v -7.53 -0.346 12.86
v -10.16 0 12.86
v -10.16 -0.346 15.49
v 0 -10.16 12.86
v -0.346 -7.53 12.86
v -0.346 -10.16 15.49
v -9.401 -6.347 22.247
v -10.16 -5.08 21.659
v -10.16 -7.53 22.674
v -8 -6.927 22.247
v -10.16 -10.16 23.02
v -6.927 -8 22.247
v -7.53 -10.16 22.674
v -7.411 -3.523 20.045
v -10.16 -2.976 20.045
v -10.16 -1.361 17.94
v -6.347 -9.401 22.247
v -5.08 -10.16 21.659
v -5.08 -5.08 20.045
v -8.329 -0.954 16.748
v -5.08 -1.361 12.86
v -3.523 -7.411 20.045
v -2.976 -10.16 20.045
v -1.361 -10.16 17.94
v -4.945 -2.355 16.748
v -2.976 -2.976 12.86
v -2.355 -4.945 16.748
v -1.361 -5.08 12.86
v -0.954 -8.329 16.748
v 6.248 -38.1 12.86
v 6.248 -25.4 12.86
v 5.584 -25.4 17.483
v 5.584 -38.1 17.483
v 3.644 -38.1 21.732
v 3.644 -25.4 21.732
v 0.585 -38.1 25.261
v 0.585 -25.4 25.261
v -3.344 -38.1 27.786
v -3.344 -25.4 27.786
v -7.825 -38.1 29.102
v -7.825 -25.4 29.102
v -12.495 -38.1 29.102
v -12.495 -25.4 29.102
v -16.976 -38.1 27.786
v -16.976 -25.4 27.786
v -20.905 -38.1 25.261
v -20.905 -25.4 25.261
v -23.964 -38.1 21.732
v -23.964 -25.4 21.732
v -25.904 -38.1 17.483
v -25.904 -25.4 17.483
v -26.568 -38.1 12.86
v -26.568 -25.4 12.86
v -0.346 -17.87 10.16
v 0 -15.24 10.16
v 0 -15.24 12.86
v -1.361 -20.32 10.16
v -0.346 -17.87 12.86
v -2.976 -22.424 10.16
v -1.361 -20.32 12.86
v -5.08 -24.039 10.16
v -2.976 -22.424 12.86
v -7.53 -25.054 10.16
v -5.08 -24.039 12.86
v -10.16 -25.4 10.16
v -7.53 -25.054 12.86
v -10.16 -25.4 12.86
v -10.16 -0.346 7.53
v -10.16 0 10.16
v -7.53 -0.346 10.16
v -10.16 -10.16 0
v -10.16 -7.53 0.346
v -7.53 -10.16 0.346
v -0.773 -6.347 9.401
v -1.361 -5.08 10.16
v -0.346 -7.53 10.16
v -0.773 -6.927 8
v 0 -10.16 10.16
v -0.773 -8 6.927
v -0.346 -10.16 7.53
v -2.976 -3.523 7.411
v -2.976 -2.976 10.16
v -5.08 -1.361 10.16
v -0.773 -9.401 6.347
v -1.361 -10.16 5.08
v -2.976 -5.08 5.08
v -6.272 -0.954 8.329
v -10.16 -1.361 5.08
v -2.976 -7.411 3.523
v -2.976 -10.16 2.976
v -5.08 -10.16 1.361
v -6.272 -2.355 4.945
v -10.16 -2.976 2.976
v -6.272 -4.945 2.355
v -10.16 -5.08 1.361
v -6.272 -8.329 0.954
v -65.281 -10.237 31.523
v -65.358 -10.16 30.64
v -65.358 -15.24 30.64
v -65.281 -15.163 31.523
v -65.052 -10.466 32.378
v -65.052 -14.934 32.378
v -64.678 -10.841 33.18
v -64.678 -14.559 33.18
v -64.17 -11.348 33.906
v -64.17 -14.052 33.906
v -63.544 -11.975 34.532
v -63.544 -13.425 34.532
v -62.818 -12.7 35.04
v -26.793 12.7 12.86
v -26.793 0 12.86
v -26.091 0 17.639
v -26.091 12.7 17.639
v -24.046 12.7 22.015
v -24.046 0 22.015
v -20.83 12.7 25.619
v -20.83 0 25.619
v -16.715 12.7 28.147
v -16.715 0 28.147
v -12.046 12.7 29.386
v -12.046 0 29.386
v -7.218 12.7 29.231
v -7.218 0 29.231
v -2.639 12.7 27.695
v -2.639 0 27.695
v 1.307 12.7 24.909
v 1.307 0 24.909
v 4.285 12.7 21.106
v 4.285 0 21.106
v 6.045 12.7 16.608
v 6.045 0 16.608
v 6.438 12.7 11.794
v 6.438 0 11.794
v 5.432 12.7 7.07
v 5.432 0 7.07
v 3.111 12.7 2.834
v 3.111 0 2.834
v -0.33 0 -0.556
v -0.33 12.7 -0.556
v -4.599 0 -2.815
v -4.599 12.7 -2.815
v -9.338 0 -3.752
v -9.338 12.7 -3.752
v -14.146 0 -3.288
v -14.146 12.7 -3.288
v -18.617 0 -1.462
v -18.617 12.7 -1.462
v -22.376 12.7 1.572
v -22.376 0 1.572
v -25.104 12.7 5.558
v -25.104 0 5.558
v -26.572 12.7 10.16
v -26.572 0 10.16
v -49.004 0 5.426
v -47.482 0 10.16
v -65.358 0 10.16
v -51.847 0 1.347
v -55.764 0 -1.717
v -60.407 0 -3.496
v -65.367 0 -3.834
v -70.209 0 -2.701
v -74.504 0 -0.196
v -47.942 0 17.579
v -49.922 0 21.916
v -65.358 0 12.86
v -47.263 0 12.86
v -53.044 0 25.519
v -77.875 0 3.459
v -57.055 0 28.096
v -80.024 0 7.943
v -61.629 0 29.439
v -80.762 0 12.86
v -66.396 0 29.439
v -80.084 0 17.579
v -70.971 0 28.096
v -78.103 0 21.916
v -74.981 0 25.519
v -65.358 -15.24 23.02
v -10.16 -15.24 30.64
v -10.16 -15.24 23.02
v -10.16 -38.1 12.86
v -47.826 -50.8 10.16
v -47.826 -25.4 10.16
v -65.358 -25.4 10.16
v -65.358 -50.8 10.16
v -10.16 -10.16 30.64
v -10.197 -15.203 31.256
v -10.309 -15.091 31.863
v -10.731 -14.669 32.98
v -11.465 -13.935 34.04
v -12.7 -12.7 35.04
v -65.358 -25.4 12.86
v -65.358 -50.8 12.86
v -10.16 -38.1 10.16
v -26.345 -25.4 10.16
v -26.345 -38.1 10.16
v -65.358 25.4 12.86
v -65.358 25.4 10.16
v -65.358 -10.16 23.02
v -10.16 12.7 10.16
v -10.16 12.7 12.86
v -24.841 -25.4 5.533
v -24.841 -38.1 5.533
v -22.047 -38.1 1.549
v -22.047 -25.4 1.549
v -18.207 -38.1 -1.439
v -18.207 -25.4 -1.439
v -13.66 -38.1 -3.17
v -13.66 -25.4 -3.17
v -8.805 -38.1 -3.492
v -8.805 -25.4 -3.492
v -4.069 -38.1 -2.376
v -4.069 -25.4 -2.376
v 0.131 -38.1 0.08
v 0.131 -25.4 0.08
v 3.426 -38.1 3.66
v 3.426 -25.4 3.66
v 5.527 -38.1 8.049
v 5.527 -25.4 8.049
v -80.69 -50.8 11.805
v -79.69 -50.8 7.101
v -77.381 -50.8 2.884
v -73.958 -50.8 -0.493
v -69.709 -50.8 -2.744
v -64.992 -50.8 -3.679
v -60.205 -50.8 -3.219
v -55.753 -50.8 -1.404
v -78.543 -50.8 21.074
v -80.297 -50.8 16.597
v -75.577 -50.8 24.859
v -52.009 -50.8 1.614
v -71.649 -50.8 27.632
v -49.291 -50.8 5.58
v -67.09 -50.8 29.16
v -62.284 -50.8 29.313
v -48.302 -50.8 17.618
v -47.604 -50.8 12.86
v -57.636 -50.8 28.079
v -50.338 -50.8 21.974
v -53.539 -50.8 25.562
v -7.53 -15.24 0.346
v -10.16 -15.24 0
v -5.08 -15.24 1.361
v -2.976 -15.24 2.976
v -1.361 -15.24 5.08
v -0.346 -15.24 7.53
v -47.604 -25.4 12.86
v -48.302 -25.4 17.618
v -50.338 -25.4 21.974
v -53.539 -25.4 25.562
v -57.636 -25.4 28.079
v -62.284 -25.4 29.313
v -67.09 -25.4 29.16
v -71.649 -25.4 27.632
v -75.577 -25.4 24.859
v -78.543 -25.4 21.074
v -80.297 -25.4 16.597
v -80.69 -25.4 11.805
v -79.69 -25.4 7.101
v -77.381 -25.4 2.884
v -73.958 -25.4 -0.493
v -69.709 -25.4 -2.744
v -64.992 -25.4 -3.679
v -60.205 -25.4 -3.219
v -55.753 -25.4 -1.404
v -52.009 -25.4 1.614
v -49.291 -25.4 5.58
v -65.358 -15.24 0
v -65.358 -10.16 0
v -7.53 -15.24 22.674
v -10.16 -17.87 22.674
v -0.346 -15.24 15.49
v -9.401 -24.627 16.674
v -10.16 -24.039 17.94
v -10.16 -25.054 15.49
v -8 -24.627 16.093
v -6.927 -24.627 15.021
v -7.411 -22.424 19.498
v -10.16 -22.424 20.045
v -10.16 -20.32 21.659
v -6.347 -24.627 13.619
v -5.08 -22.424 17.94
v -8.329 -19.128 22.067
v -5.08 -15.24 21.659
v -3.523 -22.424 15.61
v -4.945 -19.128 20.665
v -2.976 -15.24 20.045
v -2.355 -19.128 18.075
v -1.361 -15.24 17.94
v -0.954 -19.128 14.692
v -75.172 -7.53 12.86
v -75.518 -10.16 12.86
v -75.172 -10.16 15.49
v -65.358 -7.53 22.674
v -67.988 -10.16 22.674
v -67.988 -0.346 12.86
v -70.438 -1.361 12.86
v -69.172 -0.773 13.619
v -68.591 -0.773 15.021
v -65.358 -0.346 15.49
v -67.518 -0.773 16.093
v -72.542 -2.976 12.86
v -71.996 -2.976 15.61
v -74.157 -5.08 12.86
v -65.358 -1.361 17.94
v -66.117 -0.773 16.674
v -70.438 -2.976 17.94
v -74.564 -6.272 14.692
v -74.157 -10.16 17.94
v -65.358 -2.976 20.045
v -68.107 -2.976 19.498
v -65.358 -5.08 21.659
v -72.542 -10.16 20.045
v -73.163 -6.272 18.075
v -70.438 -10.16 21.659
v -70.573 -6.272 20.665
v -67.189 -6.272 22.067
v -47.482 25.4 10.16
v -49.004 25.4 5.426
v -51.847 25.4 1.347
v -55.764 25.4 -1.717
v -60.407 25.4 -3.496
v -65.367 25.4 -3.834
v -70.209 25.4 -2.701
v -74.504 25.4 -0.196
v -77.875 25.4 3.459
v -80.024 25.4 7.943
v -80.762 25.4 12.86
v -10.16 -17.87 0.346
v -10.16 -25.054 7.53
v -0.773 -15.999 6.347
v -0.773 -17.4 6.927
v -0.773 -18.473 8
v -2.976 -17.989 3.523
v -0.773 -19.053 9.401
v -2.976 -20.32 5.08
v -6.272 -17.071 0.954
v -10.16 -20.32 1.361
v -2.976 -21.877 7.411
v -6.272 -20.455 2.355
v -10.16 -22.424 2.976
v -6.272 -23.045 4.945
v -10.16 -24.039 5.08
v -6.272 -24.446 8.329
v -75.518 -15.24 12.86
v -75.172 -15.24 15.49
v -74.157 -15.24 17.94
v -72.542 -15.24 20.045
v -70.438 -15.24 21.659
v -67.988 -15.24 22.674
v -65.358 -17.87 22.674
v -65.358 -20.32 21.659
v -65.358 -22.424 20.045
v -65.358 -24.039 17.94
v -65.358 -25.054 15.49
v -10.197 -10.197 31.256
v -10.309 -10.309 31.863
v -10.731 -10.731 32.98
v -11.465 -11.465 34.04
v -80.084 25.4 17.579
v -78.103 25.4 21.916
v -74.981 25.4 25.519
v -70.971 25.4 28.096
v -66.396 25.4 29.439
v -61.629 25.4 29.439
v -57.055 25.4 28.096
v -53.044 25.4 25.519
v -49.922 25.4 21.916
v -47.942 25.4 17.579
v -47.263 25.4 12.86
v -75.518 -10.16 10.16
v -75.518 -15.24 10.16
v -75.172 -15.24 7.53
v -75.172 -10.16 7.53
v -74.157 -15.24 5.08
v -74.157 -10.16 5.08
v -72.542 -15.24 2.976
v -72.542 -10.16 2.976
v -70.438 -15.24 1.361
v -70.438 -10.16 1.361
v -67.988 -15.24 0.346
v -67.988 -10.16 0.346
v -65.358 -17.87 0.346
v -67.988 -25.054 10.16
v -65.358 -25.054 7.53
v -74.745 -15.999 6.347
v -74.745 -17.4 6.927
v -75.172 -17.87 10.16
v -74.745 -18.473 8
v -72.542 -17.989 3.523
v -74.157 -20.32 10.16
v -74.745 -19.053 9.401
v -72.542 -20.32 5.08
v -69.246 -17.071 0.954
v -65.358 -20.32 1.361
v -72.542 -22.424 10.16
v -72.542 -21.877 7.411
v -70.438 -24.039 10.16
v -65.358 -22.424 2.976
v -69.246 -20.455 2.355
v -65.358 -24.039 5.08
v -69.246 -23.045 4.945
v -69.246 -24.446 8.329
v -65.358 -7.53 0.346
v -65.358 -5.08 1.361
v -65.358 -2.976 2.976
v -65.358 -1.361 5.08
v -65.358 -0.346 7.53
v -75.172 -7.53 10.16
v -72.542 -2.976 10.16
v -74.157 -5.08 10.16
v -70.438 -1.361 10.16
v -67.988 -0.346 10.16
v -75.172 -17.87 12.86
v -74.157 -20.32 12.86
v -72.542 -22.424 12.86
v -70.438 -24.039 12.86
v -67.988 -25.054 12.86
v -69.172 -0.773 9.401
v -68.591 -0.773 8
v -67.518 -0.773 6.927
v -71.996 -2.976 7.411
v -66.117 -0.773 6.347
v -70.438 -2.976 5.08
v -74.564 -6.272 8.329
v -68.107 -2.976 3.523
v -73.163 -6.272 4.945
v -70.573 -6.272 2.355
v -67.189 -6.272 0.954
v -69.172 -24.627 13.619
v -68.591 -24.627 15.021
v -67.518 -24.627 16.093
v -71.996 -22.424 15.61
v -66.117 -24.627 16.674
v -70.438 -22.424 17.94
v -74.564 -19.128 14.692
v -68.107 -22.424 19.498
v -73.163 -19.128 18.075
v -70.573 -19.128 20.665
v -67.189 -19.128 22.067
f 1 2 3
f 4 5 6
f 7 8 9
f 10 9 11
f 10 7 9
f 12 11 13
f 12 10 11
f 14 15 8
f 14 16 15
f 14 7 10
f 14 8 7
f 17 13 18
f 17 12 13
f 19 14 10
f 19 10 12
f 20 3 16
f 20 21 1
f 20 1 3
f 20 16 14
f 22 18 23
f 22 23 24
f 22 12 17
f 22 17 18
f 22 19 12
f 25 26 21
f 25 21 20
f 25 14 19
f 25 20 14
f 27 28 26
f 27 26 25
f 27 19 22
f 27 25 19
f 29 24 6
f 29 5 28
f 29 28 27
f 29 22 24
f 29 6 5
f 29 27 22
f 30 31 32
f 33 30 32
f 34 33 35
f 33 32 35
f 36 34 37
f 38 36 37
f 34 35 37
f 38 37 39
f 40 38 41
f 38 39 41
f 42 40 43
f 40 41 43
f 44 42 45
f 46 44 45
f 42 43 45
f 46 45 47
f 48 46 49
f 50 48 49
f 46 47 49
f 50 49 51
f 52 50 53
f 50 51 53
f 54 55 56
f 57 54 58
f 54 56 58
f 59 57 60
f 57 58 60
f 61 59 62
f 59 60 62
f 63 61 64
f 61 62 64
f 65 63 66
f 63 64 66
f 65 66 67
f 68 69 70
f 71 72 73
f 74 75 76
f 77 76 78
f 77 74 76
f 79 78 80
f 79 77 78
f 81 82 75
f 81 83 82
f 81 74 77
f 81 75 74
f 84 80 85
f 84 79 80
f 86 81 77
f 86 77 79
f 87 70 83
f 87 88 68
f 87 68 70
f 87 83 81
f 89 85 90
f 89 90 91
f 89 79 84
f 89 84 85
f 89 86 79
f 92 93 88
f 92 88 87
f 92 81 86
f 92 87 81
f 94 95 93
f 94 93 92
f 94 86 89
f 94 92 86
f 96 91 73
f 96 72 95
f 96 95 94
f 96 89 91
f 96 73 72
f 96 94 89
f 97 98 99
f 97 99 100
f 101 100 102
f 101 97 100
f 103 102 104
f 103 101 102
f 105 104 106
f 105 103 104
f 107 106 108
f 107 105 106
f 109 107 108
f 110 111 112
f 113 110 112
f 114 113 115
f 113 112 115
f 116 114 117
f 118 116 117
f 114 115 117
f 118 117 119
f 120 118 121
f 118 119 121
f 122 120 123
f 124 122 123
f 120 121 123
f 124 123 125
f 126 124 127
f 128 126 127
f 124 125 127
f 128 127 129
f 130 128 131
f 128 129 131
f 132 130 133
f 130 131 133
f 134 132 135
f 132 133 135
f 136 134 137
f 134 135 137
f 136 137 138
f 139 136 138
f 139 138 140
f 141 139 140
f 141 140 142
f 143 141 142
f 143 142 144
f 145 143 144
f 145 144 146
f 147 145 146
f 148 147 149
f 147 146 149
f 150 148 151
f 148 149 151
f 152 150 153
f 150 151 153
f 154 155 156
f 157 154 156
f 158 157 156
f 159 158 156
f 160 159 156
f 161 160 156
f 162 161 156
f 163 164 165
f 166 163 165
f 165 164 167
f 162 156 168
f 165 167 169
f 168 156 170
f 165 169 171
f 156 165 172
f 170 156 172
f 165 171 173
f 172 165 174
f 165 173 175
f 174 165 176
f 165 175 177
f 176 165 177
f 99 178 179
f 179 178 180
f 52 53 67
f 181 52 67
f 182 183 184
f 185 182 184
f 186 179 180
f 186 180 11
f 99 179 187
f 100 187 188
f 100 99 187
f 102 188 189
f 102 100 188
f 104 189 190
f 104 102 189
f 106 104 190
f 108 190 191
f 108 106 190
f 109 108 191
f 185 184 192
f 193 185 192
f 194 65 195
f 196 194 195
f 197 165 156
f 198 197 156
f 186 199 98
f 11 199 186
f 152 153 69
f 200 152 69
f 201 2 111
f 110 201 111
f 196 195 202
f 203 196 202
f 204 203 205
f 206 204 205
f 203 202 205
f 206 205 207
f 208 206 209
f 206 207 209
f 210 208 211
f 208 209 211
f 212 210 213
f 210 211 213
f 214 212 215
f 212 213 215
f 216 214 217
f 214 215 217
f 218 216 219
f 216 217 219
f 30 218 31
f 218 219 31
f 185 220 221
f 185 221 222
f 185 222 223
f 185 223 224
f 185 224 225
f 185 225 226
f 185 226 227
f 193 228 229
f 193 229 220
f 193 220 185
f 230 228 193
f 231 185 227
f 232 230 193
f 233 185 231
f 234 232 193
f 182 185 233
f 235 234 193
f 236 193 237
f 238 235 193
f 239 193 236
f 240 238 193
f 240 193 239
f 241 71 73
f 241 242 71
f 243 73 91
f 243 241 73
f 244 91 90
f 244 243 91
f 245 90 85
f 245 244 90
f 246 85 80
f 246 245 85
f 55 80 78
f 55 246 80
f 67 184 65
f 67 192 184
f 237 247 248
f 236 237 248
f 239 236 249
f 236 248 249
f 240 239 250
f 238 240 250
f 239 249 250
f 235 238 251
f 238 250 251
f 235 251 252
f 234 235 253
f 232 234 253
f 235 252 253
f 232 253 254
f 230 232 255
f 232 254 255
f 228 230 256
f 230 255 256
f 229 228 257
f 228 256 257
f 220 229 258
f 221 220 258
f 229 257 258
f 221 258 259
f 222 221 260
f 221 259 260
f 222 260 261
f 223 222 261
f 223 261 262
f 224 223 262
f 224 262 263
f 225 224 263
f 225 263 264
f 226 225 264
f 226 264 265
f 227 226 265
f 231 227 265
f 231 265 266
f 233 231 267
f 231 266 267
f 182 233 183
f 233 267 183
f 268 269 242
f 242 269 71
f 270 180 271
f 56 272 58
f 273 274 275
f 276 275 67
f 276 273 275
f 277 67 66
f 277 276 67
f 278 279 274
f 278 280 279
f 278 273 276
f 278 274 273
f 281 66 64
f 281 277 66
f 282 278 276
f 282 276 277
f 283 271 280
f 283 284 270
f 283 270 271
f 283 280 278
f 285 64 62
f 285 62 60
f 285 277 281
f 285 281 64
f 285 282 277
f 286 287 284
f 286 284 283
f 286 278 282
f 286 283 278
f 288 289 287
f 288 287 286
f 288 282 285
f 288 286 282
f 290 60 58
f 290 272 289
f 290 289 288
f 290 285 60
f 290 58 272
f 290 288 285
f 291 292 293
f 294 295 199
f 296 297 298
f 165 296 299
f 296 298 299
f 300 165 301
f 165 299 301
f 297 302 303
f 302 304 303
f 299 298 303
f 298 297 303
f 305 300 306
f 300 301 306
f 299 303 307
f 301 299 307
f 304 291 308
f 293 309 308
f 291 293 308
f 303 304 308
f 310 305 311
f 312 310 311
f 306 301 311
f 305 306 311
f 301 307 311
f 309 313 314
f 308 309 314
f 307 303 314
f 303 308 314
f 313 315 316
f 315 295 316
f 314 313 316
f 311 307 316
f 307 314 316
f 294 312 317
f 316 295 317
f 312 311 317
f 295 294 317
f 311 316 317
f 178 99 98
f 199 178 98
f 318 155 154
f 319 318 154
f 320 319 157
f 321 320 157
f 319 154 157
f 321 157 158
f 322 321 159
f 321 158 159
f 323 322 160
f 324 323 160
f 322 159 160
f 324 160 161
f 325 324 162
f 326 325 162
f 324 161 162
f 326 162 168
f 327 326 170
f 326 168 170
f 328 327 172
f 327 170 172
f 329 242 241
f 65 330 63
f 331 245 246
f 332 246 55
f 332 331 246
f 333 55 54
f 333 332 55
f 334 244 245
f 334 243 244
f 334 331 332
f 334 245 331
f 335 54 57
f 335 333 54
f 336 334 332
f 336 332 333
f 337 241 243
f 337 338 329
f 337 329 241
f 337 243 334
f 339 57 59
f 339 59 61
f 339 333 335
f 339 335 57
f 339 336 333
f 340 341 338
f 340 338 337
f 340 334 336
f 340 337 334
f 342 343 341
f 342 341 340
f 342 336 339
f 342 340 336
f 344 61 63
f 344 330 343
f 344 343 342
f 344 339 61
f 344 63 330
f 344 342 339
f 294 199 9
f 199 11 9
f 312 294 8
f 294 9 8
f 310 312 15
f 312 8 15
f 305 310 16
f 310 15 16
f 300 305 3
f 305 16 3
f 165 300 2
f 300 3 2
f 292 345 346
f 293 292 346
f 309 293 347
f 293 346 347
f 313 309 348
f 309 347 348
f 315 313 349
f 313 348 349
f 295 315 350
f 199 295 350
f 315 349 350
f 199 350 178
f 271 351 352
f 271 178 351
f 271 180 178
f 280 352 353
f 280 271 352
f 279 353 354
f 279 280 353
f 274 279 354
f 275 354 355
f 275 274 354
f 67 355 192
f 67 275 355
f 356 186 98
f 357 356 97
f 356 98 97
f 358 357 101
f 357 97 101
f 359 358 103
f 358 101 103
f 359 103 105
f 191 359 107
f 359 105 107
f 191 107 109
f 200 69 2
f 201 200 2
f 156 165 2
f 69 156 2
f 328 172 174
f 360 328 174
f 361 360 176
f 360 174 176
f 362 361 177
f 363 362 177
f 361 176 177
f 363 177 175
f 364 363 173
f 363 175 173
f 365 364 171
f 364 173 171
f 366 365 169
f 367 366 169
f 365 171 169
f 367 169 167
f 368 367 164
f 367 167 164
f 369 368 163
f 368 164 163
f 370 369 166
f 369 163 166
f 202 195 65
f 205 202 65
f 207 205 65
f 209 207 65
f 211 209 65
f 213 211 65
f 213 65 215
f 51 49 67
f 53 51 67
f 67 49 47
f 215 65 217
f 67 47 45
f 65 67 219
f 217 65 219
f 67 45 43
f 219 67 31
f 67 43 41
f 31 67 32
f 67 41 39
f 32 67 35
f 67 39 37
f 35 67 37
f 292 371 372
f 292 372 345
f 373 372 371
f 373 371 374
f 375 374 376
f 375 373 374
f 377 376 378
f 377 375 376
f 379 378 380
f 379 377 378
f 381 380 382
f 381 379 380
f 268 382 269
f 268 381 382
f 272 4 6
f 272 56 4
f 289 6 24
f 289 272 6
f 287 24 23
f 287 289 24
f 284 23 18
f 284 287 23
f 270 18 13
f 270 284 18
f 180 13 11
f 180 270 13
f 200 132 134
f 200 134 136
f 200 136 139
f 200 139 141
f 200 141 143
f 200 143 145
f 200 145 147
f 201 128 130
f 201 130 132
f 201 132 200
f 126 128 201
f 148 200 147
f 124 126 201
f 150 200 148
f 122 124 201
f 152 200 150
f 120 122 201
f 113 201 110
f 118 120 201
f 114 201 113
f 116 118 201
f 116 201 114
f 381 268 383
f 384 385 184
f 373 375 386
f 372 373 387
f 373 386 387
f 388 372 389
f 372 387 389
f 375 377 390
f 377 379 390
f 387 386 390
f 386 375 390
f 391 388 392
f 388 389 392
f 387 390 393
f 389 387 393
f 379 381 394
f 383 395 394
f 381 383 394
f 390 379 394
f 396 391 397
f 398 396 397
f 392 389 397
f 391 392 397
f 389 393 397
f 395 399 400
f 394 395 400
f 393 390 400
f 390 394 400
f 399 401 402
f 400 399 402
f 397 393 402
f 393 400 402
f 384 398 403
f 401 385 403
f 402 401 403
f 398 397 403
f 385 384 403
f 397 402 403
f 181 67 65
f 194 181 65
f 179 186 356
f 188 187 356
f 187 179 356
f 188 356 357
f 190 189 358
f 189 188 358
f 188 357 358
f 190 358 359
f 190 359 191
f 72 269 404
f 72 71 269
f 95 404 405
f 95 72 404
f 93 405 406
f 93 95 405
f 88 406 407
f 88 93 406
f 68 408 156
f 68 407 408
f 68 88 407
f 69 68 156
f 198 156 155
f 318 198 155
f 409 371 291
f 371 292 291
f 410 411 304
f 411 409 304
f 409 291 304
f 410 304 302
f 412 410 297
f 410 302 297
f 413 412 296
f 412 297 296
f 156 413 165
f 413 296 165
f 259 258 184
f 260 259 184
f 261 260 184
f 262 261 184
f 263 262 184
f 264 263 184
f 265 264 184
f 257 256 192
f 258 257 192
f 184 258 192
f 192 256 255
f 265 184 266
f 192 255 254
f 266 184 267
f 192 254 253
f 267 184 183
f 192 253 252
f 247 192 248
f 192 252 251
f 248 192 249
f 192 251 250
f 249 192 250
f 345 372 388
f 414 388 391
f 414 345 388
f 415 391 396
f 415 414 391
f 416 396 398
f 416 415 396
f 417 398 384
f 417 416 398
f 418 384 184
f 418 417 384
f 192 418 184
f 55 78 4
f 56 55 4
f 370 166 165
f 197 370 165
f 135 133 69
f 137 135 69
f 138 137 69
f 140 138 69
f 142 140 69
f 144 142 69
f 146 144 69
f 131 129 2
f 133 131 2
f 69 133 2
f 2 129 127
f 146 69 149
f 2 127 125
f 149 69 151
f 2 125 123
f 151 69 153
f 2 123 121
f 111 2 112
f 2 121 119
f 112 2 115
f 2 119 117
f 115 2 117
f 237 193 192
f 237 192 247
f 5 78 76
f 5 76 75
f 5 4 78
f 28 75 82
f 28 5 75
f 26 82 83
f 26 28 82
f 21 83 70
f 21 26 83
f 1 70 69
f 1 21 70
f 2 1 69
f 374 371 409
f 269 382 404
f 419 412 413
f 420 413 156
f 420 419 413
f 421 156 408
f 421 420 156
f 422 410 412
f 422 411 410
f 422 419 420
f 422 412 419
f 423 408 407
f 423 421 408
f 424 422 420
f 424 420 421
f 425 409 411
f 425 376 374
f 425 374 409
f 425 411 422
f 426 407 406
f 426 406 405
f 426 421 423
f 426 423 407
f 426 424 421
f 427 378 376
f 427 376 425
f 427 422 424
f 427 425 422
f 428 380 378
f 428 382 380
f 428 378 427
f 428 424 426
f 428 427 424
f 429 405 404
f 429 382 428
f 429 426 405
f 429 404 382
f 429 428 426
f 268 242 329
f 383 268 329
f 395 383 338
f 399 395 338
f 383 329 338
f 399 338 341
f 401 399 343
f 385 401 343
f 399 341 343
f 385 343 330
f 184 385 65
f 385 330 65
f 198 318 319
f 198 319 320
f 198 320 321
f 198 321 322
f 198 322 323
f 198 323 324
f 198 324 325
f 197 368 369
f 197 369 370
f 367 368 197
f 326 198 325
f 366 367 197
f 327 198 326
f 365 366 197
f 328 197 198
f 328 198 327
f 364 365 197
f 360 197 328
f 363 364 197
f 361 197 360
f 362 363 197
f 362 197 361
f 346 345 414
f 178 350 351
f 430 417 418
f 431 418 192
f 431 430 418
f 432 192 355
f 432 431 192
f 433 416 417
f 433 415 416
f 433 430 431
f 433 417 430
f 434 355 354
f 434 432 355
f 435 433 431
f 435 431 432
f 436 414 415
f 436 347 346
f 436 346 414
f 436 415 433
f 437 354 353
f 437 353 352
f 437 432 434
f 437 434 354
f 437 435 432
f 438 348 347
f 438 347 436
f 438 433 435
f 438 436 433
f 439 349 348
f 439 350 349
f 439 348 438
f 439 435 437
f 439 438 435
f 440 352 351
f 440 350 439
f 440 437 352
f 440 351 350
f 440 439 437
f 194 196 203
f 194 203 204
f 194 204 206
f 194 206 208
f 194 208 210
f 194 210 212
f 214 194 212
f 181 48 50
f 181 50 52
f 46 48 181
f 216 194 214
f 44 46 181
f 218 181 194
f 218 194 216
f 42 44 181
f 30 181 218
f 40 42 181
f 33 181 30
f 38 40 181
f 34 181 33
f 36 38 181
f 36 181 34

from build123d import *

# Parameters (mm, degrees)
F0_W         = 75.5182132125
F0_H         = 23.0204220861
F1_DEPTH     = 25.4
F2_R         = 10.16
F5_DEPTH     = 25.4
F6_DEPTH     = 25.4
F7_DEPTH     = 12.7
F8_DEPTH     = 12.7
F9_W         = 55.1982132125
F9_H         = 5.08
F10_DEPTH    = 12.7
F11_T1_DEPTH = 30.48
F11_T3_DEPTH = 80.5982132125


# Not quite as in the source:
# - a fillet or chamfer that OpenCascade refuses, or shapes differently, is made with other operations: its cross-section is extruded or revolved along the edge and cut away or added


with BuildPart() as f1:
    # F0 (on Front) → F1 (new body)
    with BuildSketch(Plane.XZ):
        with Locations((-37.7591066062, 11.5102110431)):
            Rectangle(F0_W, F0_H)
    extrude(amount=F1_DEPTH)

    # F2
    f2_edges = [f1.edges().sort_by_distance(p)[0] for p in [
        (-37.759107, -25.4, 0),
        (-75.518213, -12.7, 23.020422),
        (-75.518213, -12.7, 0),
        (-75.518213, 0, 11.510211),
        (-75.518213, -25.4, 11.510211),
        (-37.759107, 0, 0),
        (0, 0, 11.510211),
        (-37.759107, 0, 23.020422),
        (0, -12.7, 23.020422),
        (-37.759107, -25.4, 23.020422),
        (0, -12.7, 0),
        (0, -25.4, 11.510211),
    ]]
    fillet(f2_edges, radius=F2_R)

    # F9 (on face) → F10 (join)
    with BuildSketch(Plane.XY.offset(23.0204220861)):
        with Locations((-37.7591066062, -12.7)):
            Rectangle(F9_W, F9_H)
    extrude(amount=F10_DEPTH)

    # F11: fillet of radius 5.08 on 4 edges, made by hand

    # F11_s2 → F11_t1 (cut)
    with BuildSketch(Plane.XZ.offset(-2.54)):
        with BuildLine():
            ThreePointArc((-10.16, 30.6404220861), (-11.6478975516, 34.2325245345), (-15.24, 35.7204220861))
            Line((-15.24, 35.7204220861), (-10.16, 35.7204220861))
            Line((-10.16, 35.7204220861), (-10.16, 30.6404220861))
        make_face()
        with BuildLine():
            ThreePointArc((-65.3582132125, 30.6404220861), (-63.8703156609, 34.2325245345), (-60.2782132125, 35.7204220861))
            Line((-60.2782132125, 35.7204220861), (-65.3582132125, 35.7204220861))
            Line((-65.3582132125, 35.7204220861), (-65.3582132125, 30.6404220861))
        make_face()
    extrude(amount=F11_T1_DEPTH, mode=Mode.SUBTRACT)

    # F11_s4 → F11_t3 (cut)
    with BuildSketch(Plane.YZ.offset(-78.0582132125)):
        with BuildLine():
            ThreePointArc((-10.16, 30.6404220861), (-11.6478975516, 34.2325245345), (-15.24, 35.7204220861))
            Line((-15.24, 35.7204220861), (-10.16, 35.7204220861))
            Line((-10.16, 35.7204220861), (-10.16, 30.6404220861))
        make_face()
        with BuildLine():
            ThreePointArc((-15.24, 30.6404220861), (-13.7521024484, 34.2325245345), (-10.16, 35.7204220861))
            Line((-10.16, 35.7204220861), (-15.24, 35.7204220861))
            Line((-15.24, 35.7204220861), (-15.24, 30.6404220861))
        make_face()
    extrude(amount=F11_T3_DEPTH, mode=Mode.SUBTRACT)


with BuildPart() as f5:
    # F4 (on face) → F5 (new body)
    with BuildSketch(Plane.XZ.offset(25.4)):
        with BuildLine():
            Line((-65.3582132125, 12.8604220861), (-47.6042628759, 12.8604220861))
            ThreePointArc((-47.6042628759, 12.8604220861), (-80.6685369308, 14.2151742503), (-47.825925372, 10.16))
            Line((-47.825925372, 10.16), (-65.3582132125, 10.16))
            Line((-65.3582132125, 10.16), (-65.3582132125, 12.8604220861))
        make_face()
    extrude(amount=F5_DEPTH)


with BuildPart() as f6:
    # F3 (on face) → F6 (new body)
    with BuildSketch(Plane(origin=(0, 0, 0), x_dir=(-1, 0, 0), z_dir=(0, 1, 0))):
        with BuildLine():
            ThreePointArc((47.4824030652, 10.16), (65.3673252812, -3.83410232), (80.7620710494, 12.8604220861))
            ThreePointArc((80.7620710494, 12.8604220861), (64.0126764774, 29.6098166581), (47.2632819055, 12.8604220861))
            Line((47.2632819055, 12.8604220861), (65.3582132125, 12.8604220861))
            Line((65.3582132125, 12.8604220861), (65.3582132125, 10.16))
            Line((65.3582132125, 10.16), (47.4824030652, 10.16))
        make_face()
    extrude(amount=F6_DEPTH)


with BuildPart() as f7:
    # F4 (on face) → F7 (new body)
    with BuildSketch(Plane.XZ.offset(25.4)):
        with BuildLine():
            ThreePointArc((6.2484602862, 12.8604220861), (-10.16, 29.2688823724), (-26.5684602862, 12.8604220861))
            Line((-26.5684602862, 12.8604220861), (-10.16, 12.8604220861))
            Line((-10.16, 12.8604220861), (-10.16, 10.16))
            Line((-10.16, 10.16), (-26.3447239557, 10.16))
            ThreePointArc((-26.3447239557, 10.16), (-8.8051626123, -3.4920084555), (6.2484602862, 12.8604220861))
        make_face()
    extrude(amount=F7_DEPTH)


with BuildPart() as f8:
    # F3 (on face) → F8 (new body)
    with BuildSketch(Plane(origin=(0, 0, 0), x_dir=(-1, 0, 0), z_dir=(0, 1, 0))):
        with BuildLine():
            Line((10.16, 12.8604220861), (26.7926303068, 12.8604220861))
            ThreePointArc((26.7926303068, 12.8604220861), (-6.4173684927, 14.2151341519), (26.5719502644, 10.16))
            Line((26.5719502644, 10.16), (10.16, 10.16))
            Line((10.16, 10.16), (10.16, 12.8604220861))
        make_face()
    extrude(amount=F8_DEPTH)


solid = Compound([f1.part, f5.part, f6.part, f7.part, f8.part])
